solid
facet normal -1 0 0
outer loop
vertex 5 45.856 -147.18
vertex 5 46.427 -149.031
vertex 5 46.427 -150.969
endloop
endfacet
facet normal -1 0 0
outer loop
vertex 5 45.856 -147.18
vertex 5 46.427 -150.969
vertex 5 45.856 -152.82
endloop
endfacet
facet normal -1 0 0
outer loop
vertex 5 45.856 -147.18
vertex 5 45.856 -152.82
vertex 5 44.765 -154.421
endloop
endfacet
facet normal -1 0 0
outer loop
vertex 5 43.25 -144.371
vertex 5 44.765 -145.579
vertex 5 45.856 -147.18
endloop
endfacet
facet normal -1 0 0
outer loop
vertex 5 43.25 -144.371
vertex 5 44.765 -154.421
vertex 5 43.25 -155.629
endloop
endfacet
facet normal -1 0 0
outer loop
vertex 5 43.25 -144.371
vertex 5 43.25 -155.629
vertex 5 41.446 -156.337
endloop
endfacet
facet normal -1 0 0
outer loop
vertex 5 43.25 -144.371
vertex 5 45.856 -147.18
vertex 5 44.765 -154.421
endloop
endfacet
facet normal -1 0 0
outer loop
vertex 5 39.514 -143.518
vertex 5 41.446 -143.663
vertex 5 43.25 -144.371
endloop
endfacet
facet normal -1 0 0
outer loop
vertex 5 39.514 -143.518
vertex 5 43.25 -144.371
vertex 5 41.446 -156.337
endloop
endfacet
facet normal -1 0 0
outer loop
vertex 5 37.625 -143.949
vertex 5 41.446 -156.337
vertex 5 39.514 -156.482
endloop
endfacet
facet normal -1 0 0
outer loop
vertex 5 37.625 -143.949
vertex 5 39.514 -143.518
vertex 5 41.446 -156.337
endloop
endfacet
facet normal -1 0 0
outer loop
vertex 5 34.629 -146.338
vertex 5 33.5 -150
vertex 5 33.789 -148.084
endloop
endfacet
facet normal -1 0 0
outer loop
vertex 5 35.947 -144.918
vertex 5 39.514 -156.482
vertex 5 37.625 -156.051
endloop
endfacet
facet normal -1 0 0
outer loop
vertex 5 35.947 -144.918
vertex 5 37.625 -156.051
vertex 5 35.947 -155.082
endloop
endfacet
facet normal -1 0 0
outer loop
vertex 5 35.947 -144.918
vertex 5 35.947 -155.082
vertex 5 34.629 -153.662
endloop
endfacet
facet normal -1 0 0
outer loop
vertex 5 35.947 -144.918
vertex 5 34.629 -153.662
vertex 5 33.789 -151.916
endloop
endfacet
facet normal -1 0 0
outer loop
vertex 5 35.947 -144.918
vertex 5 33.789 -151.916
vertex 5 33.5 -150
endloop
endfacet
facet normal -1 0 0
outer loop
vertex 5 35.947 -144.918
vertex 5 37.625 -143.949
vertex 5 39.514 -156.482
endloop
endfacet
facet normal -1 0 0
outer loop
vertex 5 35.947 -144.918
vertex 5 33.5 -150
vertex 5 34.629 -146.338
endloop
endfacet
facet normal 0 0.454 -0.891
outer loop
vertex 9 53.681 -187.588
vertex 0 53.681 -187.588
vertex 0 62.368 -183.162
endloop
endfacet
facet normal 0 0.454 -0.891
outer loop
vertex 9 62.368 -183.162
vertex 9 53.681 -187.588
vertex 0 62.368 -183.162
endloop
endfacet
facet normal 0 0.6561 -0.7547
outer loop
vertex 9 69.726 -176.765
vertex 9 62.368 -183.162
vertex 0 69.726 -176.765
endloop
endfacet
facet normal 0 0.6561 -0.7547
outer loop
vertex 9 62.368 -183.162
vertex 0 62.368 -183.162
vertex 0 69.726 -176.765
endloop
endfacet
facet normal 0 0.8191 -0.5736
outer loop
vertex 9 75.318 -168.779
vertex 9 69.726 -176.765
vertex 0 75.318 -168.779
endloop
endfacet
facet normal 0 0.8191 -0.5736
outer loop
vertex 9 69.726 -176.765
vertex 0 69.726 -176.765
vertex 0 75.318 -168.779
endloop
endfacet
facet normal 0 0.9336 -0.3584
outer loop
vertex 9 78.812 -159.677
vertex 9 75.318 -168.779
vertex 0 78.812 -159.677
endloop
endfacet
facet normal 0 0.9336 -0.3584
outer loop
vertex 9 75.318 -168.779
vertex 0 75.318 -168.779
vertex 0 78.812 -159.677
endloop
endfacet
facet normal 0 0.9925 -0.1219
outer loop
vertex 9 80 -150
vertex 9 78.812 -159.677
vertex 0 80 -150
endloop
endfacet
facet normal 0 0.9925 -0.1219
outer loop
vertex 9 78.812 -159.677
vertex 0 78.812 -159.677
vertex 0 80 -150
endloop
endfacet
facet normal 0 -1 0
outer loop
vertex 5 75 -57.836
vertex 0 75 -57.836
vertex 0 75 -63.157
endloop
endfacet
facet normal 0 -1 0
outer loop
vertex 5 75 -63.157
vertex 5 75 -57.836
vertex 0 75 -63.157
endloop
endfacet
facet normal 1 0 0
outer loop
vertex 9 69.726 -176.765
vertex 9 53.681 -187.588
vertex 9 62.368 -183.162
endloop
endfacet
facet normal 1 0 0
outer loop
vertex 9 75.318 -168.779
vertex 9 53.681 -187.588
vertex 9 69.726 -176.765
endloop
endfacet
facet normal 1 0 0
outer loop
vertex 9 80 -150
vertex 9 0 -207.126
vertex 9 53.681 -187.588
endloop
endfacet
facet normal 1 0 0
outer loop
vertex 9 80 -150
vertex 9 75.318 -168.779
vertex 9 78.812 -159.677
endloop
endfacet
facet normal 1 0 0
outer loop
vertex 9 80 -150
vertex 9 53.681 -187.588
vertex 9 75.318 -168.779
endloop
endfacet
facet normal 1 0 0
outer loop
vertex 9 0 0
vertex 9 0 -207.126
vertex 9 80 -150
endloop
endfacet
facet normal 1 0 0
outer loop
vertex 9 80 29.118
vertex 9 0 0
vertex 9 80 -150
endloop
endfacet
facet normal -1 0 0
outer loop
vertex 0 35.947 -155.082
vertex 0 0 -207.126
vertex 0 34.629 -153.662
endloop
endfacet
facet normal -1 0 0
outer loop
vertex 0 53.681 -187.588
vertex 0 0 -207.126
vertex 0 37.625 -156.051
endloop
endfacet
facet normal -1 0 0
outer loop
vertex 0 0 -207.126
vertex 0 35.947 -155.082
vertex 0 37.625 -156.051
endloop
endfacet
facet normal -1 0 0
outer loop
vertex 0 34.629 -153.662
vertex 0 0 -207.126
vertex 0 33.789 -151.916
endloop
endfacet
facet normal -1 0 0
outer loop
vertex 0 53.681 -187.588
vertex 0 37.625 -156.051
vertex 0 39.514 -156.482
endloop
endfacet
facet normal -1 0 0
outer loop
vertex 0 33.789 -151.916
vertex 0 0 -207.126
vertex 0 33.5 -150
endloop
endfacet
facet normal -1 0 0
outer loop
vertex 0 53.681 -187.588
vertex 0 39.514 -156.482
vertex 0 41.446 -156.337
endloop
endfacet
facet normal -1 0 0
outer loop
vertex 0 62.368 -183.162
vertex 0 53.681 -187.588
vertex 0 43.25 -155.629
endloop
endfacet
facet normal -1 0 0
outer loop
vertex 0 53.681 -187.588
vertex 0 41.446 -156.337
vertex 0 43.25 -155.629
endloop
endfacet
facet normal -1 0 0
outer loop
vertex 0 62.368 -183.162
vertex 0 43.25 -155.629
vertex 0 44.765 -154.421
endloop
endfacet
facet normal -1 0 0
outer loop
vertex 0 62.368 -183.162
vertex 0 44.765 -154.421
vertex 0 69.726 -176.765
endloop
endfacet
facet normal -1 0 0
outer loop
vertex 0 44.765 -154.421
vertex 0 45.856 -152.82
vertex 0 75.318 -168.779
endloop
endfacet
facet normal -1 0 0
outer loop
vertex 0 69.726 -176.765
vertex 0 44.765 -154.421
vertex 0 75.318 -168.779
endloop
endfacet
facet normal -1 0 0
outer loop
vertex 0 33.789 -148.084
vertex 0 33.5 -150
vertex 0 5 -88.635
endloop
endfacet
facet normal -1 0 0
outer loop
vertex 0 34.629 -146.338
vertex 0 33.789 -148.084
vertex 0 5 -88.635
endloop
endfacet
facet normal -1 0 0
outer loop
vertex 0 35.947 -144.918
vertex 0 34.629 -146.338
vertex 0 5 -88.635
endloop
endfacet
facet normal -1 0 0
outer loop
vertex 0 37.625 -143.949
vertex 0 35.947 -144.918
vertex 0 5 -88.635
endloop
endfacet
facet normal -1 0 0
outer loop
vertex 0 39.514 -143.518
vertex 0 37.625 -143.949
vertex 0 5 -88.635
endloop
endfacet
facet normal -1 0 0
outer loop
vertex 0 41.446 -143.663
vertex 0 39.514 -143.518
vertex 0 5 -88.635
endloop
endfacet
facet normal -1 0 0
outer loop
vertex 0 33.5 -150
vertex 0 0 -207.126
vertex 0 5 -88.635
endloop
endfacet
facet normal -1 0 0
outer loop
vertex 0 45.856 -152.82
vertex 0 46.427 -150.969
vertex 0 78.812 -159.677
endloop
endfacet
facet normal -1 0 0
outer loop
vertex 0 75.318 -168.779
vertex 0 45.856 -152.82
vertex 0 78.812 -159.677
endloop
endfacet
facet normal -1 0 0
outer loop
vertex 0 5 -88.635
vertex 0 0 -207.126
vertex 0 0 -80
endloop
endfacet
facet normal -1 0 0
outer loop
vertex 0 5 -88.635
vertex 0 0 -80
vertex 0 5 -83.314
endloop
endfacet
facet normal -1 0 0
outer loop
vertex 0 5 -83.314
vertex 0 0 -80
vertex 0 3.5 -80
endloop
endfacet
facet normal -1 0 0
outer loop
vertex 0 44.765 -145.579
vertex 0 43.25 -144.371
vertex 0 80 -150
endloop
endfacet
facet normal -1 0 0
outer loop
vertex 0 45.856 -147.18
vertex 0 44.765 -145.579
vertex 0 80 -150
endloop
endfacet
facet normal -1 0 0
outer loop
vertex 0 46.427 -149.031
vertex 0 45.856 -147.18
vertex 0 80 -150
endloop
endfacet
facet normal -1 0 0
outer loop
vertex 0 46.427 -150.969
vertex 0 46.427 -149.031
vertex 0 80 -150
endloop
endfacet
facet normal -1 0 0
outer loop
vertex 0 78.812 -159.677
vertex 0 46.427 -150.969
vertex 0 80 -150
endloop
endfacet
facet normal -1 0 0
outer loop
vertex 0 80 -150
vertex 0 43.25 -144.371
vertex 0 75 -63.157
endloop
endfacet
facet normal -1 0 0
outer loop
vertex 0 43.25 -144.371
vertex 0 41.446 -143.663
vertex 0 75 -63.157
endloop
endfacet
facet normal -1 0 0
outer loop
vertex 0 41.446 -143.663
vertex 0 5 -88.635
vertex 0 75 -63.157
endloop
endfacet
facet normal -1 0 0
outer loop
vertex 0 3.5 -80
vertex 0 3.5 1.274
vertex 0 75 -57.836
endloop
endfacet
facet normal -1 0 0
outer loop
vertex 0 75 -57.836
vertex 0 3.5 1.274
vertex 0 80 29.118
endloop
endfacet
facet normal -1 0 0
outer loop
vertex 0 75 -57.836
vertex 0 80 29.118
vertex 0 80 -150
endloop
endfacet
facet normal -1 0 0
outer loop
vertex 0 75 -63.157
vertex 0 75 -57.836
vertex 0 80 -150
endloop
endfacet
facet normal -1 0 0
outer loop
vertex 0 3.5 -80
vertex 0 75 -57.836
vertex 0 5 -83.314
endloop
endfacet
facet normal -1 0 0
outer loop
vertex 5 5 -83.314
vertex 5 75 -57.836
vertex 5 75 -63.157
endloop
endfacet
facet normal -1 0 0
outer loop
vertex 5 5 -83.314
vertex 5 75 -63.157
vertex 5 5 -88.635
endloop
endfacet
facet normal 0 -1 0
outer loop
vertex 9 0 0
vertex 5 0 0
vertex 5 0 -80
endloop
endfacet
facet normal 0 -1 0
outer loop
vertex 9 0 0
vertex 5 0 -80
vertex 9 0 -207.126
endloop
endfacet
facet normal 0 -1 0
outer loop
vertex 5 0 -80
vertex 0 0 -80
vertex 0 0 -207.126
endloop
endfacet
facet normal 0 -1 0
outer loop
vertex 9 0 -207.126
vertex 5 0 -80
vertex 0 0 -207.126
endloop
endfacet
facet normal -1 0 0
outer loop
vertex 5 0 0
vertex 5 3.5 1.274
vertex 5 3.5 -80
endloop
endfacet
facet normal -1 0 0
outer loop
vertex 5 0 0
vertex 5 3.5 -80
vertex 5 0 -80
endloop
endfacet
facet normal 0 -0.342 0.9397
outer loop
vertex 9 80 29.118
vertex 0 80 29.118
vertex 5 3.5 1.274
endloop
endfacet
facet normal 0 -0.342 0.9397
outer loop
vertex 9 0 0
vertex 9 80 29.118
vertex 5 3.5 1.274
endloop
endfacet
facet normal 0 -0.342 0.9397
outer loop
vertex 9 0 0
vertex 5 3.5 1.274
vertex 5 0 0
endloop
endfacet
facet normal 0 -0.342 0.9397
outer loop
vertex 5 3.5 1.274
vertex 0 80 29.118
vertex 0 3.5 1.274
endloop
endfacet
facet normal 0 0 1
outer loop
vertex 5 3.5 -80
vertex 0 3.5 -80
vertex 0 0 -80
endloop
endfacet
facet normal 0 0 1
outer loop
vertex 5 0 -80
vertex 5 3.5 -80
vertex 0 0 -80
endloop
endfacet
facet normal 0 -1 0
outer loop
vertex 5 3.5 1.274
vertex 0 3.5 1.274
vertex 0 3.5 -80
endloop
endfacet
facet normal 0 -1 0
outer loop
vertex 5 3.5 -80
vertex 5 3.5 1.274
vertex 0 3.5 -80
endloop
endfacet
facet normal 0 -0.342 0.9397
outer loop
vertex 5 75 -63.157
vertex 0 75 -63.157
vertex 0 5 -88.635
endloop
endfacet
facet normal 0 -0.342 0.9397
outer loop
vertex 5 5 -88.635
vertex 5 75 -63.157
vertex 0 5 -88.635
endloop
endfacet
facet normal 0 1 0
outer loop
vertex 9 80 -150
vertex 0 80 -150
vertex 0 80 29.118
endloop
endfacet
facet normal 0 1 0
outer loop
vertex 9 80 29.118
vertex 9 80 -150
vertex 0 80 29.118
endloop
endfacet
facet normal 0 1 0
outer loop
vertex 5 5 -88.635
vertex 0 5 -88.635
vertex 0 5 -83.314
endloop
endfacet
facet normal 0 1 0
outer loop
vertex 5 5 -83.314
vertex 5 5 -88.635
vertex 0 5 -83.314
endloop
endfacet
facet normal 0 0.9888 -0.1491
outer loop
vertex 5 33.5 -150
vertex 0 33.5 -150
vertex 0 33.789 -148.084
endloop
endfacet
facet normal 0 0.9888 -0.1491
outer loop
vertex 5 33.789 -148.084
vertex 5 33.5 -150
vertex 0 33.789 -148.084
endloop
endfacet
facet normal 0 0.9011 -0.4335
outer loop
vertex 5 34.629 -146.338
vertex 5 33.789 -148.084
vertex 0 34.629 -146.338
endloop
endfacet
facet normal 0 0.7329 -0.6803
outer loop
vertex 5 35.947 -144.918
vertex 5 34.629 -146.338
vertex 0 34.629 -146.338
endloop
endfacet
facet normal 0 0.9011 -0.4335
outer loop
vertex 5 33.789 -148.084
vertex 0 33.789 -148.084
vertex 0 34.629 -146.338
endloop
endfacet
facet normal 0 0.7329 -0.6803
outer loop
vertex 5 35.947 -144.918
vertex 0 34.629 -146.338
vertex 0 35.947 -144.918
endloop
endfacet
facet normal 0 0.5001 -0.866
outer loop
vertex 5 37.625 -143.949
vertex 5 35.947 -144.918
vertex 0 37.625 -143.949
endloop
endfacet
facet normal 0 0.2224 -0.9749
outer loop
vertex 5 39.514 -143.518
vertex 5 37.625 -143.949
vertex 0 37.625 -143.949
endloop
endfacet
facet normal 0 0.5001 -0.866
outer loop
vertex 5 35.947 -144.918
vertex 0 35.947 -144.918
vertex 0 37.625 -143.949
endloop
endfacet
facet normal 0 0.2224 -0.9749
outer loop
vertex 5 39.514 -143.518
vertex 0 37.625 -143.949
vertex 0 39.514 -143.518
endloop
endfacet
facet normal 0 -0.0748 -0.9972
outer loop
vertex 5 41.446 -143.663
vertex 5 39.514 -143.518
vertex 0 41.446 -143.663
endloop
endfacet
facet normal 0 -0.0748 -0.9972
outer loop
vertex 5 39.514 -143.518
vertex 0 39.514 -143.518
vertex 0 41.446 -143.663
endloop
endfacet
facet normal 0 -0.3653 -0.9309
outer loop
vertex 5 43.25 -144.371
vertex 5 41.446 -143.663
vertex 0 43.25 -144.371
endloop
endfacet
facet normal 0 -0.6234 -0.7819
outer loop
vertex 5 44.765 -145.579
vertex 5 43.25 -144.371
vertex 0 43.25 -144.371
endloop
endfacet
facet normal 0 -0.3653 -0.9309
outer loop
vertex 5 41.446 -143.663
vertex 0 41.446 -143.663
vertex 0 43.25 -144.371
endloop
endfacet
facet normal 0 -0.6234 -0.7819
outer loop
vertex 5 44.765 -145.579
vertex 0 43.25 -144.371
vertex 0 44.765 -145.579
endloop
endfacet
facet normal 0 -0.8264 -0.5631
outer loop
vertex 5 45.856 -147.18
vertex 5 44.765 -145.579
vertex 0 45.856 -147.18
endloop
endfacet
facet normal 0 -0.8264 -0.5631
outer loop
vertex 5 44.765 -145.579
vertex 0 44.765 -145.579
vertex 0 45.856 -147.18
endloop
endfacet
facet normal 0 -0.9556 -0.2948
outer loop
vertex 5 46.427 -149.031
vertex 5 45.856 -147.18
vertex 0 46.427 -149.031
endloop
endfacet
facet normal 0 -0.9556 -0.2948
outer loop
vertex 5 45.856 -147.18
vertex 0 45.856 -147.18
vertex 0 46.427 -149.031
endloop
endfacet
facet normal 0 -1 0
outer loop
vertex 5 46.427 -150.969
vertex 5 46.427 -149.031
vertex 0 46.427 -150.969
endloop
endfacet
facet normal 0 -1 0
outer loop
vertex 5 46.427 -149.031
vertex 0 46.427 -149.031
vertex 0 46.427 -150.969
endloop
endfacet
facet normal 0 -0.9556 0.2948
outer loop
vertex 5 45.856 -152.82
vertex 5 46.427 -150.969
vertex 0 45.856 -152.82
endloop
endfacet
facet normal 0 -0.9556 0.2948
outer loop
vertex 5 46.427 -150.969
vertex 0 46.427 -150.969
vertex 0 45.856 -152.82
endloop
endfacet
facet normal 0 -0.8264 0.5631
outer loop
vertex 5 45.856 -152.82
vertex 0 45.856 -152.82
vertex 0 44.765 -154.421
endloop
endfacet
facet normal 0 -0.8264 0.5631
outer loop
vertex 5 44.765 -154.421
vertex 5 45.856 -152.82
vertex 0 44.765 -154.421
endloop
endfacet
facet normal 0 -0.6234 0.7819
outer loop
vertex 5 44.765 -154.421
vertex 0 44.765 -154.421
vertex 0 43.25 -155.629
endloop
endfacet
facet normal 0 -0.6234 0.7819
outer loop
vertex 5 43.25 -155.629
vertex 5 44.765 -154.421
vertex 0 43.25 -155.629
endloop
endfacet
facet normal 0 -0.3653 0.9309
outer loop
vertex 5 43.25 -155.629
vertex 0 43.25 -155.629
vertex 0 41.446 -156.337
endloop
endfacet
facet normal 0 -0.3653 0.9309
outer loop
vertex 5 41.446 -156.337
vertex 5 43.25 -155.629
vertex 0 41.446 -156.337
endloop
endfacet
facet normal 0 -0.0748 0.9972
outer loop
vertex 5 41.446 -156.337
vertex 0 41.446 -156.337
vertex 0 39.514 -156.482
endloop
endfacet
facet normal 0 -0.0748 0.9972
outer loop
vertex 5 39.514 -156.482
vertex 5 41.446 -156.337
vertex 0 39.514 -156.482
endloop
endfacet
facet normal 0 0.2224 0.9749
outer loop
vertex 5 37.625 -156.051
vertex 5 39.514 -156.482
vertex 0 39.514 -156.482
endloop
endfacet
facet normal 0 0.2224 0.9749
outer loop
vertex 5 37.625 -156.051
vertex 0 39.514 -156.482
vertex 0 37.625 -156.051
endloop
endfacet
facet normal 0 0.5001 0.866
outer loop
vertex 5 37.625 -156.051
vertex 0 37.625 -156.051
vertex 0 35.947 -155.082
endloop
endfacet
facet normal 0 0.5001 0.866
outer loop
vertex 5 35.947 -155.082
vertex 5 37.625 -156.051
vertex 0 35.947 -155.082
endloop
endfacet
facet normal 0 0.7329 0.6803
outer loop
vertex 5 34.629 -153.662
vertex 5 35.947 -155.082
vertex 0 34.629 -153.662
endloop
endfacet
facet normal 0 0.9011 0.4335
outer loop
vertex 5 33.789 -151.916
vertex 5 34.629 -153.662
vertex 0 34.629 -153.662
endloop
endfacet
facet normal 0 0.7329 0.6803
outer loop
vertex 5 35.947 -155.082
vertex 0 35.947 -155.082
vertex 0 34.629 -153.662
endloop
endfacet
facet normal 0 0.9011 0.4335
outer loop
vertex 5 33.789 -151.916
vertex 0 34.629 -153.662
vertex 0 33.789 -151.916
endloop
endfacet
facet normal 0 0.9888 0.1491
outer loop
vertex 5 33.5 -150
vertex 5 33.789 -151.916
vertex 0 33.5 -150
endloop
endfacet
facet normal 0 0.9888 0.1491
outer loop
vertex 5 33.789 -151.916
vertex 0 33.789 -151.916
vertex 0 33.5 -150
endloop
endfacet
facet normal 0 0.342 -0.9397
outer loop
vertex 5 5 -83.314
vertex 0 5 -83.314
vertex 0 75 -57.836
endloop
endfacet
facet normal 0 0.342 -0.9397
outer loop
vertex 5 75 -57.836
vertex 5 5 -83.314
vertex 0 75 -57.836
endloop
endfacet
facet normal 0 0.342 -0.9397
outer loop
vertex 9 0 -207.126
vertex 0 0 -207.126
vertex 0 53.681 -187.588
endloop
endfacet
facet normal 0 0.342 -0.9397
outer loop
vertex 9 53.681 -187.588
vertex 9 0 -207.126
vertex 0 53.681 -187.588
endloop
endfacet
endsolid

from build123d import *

# Parameters (mm, degrees)
F1_DEPTH = 9
F2_R     = 6.5
F3_DEPTH = 5
F5_DEPTH = 5
F7_DEPTH = 5


with BuildPart() as f1:
    # F0 (on Right) → F1 (new body)
    with BuildSketch(Plane.YZ):
        with BuildLine():
            Line((80, 29.117619), (0, 0))
            Line((0, 0), (0, -207.12592))
            Line((0, -207.12592), (53.680806, -187.587705))
            ThreePointArc((53.680806, -187.587705), (72.766082, -172.943057), (80, -150))
            Line((80, -150), (80, 29.117619))
        make_face()
    extrude(amount=F1_DEPTH)

    # F2 (on face) → F3 (cut)
    with BuildSketch(Plane(origin=(0, 0, 0), x_dir=(0, -1, 0), z_dir=(-1, 0, 0))):
        with Locations((-40, -150)):
            Circle(F2_R)
    extrude(amount=-F3_DEPTH, mode=Mode.SUBTRACT)

    # F4 (on face) → F5 (cut)
    with BuildSketch(Plane(origin=(0, 0, 0), x_dir=(0, -1, 0), z_dir=(-1, 0, 0))):
        Polygon((-5, -88.635259), (-5, -83.314371), (-75, -57.836454), (-75, -63.157343), align=None)
    extrude(amount=-F5_DEPTH, mode=Mode.SUBTRACT)

    # F6 (on face) → F7 (cut)
    with BuildSketch(Plane(origin=(0, 0, 0), x_dir=(0, -1, 0), z_dir=(-1, 0, 0))):
        Polygon((0, 0), (-3.5, 1.273896), (-3.5, -80), (0, -80), align=None)
    extrude(amount=-F7_DEPTH, mode=Mode.SUBTRACT)


solid = f1.part
